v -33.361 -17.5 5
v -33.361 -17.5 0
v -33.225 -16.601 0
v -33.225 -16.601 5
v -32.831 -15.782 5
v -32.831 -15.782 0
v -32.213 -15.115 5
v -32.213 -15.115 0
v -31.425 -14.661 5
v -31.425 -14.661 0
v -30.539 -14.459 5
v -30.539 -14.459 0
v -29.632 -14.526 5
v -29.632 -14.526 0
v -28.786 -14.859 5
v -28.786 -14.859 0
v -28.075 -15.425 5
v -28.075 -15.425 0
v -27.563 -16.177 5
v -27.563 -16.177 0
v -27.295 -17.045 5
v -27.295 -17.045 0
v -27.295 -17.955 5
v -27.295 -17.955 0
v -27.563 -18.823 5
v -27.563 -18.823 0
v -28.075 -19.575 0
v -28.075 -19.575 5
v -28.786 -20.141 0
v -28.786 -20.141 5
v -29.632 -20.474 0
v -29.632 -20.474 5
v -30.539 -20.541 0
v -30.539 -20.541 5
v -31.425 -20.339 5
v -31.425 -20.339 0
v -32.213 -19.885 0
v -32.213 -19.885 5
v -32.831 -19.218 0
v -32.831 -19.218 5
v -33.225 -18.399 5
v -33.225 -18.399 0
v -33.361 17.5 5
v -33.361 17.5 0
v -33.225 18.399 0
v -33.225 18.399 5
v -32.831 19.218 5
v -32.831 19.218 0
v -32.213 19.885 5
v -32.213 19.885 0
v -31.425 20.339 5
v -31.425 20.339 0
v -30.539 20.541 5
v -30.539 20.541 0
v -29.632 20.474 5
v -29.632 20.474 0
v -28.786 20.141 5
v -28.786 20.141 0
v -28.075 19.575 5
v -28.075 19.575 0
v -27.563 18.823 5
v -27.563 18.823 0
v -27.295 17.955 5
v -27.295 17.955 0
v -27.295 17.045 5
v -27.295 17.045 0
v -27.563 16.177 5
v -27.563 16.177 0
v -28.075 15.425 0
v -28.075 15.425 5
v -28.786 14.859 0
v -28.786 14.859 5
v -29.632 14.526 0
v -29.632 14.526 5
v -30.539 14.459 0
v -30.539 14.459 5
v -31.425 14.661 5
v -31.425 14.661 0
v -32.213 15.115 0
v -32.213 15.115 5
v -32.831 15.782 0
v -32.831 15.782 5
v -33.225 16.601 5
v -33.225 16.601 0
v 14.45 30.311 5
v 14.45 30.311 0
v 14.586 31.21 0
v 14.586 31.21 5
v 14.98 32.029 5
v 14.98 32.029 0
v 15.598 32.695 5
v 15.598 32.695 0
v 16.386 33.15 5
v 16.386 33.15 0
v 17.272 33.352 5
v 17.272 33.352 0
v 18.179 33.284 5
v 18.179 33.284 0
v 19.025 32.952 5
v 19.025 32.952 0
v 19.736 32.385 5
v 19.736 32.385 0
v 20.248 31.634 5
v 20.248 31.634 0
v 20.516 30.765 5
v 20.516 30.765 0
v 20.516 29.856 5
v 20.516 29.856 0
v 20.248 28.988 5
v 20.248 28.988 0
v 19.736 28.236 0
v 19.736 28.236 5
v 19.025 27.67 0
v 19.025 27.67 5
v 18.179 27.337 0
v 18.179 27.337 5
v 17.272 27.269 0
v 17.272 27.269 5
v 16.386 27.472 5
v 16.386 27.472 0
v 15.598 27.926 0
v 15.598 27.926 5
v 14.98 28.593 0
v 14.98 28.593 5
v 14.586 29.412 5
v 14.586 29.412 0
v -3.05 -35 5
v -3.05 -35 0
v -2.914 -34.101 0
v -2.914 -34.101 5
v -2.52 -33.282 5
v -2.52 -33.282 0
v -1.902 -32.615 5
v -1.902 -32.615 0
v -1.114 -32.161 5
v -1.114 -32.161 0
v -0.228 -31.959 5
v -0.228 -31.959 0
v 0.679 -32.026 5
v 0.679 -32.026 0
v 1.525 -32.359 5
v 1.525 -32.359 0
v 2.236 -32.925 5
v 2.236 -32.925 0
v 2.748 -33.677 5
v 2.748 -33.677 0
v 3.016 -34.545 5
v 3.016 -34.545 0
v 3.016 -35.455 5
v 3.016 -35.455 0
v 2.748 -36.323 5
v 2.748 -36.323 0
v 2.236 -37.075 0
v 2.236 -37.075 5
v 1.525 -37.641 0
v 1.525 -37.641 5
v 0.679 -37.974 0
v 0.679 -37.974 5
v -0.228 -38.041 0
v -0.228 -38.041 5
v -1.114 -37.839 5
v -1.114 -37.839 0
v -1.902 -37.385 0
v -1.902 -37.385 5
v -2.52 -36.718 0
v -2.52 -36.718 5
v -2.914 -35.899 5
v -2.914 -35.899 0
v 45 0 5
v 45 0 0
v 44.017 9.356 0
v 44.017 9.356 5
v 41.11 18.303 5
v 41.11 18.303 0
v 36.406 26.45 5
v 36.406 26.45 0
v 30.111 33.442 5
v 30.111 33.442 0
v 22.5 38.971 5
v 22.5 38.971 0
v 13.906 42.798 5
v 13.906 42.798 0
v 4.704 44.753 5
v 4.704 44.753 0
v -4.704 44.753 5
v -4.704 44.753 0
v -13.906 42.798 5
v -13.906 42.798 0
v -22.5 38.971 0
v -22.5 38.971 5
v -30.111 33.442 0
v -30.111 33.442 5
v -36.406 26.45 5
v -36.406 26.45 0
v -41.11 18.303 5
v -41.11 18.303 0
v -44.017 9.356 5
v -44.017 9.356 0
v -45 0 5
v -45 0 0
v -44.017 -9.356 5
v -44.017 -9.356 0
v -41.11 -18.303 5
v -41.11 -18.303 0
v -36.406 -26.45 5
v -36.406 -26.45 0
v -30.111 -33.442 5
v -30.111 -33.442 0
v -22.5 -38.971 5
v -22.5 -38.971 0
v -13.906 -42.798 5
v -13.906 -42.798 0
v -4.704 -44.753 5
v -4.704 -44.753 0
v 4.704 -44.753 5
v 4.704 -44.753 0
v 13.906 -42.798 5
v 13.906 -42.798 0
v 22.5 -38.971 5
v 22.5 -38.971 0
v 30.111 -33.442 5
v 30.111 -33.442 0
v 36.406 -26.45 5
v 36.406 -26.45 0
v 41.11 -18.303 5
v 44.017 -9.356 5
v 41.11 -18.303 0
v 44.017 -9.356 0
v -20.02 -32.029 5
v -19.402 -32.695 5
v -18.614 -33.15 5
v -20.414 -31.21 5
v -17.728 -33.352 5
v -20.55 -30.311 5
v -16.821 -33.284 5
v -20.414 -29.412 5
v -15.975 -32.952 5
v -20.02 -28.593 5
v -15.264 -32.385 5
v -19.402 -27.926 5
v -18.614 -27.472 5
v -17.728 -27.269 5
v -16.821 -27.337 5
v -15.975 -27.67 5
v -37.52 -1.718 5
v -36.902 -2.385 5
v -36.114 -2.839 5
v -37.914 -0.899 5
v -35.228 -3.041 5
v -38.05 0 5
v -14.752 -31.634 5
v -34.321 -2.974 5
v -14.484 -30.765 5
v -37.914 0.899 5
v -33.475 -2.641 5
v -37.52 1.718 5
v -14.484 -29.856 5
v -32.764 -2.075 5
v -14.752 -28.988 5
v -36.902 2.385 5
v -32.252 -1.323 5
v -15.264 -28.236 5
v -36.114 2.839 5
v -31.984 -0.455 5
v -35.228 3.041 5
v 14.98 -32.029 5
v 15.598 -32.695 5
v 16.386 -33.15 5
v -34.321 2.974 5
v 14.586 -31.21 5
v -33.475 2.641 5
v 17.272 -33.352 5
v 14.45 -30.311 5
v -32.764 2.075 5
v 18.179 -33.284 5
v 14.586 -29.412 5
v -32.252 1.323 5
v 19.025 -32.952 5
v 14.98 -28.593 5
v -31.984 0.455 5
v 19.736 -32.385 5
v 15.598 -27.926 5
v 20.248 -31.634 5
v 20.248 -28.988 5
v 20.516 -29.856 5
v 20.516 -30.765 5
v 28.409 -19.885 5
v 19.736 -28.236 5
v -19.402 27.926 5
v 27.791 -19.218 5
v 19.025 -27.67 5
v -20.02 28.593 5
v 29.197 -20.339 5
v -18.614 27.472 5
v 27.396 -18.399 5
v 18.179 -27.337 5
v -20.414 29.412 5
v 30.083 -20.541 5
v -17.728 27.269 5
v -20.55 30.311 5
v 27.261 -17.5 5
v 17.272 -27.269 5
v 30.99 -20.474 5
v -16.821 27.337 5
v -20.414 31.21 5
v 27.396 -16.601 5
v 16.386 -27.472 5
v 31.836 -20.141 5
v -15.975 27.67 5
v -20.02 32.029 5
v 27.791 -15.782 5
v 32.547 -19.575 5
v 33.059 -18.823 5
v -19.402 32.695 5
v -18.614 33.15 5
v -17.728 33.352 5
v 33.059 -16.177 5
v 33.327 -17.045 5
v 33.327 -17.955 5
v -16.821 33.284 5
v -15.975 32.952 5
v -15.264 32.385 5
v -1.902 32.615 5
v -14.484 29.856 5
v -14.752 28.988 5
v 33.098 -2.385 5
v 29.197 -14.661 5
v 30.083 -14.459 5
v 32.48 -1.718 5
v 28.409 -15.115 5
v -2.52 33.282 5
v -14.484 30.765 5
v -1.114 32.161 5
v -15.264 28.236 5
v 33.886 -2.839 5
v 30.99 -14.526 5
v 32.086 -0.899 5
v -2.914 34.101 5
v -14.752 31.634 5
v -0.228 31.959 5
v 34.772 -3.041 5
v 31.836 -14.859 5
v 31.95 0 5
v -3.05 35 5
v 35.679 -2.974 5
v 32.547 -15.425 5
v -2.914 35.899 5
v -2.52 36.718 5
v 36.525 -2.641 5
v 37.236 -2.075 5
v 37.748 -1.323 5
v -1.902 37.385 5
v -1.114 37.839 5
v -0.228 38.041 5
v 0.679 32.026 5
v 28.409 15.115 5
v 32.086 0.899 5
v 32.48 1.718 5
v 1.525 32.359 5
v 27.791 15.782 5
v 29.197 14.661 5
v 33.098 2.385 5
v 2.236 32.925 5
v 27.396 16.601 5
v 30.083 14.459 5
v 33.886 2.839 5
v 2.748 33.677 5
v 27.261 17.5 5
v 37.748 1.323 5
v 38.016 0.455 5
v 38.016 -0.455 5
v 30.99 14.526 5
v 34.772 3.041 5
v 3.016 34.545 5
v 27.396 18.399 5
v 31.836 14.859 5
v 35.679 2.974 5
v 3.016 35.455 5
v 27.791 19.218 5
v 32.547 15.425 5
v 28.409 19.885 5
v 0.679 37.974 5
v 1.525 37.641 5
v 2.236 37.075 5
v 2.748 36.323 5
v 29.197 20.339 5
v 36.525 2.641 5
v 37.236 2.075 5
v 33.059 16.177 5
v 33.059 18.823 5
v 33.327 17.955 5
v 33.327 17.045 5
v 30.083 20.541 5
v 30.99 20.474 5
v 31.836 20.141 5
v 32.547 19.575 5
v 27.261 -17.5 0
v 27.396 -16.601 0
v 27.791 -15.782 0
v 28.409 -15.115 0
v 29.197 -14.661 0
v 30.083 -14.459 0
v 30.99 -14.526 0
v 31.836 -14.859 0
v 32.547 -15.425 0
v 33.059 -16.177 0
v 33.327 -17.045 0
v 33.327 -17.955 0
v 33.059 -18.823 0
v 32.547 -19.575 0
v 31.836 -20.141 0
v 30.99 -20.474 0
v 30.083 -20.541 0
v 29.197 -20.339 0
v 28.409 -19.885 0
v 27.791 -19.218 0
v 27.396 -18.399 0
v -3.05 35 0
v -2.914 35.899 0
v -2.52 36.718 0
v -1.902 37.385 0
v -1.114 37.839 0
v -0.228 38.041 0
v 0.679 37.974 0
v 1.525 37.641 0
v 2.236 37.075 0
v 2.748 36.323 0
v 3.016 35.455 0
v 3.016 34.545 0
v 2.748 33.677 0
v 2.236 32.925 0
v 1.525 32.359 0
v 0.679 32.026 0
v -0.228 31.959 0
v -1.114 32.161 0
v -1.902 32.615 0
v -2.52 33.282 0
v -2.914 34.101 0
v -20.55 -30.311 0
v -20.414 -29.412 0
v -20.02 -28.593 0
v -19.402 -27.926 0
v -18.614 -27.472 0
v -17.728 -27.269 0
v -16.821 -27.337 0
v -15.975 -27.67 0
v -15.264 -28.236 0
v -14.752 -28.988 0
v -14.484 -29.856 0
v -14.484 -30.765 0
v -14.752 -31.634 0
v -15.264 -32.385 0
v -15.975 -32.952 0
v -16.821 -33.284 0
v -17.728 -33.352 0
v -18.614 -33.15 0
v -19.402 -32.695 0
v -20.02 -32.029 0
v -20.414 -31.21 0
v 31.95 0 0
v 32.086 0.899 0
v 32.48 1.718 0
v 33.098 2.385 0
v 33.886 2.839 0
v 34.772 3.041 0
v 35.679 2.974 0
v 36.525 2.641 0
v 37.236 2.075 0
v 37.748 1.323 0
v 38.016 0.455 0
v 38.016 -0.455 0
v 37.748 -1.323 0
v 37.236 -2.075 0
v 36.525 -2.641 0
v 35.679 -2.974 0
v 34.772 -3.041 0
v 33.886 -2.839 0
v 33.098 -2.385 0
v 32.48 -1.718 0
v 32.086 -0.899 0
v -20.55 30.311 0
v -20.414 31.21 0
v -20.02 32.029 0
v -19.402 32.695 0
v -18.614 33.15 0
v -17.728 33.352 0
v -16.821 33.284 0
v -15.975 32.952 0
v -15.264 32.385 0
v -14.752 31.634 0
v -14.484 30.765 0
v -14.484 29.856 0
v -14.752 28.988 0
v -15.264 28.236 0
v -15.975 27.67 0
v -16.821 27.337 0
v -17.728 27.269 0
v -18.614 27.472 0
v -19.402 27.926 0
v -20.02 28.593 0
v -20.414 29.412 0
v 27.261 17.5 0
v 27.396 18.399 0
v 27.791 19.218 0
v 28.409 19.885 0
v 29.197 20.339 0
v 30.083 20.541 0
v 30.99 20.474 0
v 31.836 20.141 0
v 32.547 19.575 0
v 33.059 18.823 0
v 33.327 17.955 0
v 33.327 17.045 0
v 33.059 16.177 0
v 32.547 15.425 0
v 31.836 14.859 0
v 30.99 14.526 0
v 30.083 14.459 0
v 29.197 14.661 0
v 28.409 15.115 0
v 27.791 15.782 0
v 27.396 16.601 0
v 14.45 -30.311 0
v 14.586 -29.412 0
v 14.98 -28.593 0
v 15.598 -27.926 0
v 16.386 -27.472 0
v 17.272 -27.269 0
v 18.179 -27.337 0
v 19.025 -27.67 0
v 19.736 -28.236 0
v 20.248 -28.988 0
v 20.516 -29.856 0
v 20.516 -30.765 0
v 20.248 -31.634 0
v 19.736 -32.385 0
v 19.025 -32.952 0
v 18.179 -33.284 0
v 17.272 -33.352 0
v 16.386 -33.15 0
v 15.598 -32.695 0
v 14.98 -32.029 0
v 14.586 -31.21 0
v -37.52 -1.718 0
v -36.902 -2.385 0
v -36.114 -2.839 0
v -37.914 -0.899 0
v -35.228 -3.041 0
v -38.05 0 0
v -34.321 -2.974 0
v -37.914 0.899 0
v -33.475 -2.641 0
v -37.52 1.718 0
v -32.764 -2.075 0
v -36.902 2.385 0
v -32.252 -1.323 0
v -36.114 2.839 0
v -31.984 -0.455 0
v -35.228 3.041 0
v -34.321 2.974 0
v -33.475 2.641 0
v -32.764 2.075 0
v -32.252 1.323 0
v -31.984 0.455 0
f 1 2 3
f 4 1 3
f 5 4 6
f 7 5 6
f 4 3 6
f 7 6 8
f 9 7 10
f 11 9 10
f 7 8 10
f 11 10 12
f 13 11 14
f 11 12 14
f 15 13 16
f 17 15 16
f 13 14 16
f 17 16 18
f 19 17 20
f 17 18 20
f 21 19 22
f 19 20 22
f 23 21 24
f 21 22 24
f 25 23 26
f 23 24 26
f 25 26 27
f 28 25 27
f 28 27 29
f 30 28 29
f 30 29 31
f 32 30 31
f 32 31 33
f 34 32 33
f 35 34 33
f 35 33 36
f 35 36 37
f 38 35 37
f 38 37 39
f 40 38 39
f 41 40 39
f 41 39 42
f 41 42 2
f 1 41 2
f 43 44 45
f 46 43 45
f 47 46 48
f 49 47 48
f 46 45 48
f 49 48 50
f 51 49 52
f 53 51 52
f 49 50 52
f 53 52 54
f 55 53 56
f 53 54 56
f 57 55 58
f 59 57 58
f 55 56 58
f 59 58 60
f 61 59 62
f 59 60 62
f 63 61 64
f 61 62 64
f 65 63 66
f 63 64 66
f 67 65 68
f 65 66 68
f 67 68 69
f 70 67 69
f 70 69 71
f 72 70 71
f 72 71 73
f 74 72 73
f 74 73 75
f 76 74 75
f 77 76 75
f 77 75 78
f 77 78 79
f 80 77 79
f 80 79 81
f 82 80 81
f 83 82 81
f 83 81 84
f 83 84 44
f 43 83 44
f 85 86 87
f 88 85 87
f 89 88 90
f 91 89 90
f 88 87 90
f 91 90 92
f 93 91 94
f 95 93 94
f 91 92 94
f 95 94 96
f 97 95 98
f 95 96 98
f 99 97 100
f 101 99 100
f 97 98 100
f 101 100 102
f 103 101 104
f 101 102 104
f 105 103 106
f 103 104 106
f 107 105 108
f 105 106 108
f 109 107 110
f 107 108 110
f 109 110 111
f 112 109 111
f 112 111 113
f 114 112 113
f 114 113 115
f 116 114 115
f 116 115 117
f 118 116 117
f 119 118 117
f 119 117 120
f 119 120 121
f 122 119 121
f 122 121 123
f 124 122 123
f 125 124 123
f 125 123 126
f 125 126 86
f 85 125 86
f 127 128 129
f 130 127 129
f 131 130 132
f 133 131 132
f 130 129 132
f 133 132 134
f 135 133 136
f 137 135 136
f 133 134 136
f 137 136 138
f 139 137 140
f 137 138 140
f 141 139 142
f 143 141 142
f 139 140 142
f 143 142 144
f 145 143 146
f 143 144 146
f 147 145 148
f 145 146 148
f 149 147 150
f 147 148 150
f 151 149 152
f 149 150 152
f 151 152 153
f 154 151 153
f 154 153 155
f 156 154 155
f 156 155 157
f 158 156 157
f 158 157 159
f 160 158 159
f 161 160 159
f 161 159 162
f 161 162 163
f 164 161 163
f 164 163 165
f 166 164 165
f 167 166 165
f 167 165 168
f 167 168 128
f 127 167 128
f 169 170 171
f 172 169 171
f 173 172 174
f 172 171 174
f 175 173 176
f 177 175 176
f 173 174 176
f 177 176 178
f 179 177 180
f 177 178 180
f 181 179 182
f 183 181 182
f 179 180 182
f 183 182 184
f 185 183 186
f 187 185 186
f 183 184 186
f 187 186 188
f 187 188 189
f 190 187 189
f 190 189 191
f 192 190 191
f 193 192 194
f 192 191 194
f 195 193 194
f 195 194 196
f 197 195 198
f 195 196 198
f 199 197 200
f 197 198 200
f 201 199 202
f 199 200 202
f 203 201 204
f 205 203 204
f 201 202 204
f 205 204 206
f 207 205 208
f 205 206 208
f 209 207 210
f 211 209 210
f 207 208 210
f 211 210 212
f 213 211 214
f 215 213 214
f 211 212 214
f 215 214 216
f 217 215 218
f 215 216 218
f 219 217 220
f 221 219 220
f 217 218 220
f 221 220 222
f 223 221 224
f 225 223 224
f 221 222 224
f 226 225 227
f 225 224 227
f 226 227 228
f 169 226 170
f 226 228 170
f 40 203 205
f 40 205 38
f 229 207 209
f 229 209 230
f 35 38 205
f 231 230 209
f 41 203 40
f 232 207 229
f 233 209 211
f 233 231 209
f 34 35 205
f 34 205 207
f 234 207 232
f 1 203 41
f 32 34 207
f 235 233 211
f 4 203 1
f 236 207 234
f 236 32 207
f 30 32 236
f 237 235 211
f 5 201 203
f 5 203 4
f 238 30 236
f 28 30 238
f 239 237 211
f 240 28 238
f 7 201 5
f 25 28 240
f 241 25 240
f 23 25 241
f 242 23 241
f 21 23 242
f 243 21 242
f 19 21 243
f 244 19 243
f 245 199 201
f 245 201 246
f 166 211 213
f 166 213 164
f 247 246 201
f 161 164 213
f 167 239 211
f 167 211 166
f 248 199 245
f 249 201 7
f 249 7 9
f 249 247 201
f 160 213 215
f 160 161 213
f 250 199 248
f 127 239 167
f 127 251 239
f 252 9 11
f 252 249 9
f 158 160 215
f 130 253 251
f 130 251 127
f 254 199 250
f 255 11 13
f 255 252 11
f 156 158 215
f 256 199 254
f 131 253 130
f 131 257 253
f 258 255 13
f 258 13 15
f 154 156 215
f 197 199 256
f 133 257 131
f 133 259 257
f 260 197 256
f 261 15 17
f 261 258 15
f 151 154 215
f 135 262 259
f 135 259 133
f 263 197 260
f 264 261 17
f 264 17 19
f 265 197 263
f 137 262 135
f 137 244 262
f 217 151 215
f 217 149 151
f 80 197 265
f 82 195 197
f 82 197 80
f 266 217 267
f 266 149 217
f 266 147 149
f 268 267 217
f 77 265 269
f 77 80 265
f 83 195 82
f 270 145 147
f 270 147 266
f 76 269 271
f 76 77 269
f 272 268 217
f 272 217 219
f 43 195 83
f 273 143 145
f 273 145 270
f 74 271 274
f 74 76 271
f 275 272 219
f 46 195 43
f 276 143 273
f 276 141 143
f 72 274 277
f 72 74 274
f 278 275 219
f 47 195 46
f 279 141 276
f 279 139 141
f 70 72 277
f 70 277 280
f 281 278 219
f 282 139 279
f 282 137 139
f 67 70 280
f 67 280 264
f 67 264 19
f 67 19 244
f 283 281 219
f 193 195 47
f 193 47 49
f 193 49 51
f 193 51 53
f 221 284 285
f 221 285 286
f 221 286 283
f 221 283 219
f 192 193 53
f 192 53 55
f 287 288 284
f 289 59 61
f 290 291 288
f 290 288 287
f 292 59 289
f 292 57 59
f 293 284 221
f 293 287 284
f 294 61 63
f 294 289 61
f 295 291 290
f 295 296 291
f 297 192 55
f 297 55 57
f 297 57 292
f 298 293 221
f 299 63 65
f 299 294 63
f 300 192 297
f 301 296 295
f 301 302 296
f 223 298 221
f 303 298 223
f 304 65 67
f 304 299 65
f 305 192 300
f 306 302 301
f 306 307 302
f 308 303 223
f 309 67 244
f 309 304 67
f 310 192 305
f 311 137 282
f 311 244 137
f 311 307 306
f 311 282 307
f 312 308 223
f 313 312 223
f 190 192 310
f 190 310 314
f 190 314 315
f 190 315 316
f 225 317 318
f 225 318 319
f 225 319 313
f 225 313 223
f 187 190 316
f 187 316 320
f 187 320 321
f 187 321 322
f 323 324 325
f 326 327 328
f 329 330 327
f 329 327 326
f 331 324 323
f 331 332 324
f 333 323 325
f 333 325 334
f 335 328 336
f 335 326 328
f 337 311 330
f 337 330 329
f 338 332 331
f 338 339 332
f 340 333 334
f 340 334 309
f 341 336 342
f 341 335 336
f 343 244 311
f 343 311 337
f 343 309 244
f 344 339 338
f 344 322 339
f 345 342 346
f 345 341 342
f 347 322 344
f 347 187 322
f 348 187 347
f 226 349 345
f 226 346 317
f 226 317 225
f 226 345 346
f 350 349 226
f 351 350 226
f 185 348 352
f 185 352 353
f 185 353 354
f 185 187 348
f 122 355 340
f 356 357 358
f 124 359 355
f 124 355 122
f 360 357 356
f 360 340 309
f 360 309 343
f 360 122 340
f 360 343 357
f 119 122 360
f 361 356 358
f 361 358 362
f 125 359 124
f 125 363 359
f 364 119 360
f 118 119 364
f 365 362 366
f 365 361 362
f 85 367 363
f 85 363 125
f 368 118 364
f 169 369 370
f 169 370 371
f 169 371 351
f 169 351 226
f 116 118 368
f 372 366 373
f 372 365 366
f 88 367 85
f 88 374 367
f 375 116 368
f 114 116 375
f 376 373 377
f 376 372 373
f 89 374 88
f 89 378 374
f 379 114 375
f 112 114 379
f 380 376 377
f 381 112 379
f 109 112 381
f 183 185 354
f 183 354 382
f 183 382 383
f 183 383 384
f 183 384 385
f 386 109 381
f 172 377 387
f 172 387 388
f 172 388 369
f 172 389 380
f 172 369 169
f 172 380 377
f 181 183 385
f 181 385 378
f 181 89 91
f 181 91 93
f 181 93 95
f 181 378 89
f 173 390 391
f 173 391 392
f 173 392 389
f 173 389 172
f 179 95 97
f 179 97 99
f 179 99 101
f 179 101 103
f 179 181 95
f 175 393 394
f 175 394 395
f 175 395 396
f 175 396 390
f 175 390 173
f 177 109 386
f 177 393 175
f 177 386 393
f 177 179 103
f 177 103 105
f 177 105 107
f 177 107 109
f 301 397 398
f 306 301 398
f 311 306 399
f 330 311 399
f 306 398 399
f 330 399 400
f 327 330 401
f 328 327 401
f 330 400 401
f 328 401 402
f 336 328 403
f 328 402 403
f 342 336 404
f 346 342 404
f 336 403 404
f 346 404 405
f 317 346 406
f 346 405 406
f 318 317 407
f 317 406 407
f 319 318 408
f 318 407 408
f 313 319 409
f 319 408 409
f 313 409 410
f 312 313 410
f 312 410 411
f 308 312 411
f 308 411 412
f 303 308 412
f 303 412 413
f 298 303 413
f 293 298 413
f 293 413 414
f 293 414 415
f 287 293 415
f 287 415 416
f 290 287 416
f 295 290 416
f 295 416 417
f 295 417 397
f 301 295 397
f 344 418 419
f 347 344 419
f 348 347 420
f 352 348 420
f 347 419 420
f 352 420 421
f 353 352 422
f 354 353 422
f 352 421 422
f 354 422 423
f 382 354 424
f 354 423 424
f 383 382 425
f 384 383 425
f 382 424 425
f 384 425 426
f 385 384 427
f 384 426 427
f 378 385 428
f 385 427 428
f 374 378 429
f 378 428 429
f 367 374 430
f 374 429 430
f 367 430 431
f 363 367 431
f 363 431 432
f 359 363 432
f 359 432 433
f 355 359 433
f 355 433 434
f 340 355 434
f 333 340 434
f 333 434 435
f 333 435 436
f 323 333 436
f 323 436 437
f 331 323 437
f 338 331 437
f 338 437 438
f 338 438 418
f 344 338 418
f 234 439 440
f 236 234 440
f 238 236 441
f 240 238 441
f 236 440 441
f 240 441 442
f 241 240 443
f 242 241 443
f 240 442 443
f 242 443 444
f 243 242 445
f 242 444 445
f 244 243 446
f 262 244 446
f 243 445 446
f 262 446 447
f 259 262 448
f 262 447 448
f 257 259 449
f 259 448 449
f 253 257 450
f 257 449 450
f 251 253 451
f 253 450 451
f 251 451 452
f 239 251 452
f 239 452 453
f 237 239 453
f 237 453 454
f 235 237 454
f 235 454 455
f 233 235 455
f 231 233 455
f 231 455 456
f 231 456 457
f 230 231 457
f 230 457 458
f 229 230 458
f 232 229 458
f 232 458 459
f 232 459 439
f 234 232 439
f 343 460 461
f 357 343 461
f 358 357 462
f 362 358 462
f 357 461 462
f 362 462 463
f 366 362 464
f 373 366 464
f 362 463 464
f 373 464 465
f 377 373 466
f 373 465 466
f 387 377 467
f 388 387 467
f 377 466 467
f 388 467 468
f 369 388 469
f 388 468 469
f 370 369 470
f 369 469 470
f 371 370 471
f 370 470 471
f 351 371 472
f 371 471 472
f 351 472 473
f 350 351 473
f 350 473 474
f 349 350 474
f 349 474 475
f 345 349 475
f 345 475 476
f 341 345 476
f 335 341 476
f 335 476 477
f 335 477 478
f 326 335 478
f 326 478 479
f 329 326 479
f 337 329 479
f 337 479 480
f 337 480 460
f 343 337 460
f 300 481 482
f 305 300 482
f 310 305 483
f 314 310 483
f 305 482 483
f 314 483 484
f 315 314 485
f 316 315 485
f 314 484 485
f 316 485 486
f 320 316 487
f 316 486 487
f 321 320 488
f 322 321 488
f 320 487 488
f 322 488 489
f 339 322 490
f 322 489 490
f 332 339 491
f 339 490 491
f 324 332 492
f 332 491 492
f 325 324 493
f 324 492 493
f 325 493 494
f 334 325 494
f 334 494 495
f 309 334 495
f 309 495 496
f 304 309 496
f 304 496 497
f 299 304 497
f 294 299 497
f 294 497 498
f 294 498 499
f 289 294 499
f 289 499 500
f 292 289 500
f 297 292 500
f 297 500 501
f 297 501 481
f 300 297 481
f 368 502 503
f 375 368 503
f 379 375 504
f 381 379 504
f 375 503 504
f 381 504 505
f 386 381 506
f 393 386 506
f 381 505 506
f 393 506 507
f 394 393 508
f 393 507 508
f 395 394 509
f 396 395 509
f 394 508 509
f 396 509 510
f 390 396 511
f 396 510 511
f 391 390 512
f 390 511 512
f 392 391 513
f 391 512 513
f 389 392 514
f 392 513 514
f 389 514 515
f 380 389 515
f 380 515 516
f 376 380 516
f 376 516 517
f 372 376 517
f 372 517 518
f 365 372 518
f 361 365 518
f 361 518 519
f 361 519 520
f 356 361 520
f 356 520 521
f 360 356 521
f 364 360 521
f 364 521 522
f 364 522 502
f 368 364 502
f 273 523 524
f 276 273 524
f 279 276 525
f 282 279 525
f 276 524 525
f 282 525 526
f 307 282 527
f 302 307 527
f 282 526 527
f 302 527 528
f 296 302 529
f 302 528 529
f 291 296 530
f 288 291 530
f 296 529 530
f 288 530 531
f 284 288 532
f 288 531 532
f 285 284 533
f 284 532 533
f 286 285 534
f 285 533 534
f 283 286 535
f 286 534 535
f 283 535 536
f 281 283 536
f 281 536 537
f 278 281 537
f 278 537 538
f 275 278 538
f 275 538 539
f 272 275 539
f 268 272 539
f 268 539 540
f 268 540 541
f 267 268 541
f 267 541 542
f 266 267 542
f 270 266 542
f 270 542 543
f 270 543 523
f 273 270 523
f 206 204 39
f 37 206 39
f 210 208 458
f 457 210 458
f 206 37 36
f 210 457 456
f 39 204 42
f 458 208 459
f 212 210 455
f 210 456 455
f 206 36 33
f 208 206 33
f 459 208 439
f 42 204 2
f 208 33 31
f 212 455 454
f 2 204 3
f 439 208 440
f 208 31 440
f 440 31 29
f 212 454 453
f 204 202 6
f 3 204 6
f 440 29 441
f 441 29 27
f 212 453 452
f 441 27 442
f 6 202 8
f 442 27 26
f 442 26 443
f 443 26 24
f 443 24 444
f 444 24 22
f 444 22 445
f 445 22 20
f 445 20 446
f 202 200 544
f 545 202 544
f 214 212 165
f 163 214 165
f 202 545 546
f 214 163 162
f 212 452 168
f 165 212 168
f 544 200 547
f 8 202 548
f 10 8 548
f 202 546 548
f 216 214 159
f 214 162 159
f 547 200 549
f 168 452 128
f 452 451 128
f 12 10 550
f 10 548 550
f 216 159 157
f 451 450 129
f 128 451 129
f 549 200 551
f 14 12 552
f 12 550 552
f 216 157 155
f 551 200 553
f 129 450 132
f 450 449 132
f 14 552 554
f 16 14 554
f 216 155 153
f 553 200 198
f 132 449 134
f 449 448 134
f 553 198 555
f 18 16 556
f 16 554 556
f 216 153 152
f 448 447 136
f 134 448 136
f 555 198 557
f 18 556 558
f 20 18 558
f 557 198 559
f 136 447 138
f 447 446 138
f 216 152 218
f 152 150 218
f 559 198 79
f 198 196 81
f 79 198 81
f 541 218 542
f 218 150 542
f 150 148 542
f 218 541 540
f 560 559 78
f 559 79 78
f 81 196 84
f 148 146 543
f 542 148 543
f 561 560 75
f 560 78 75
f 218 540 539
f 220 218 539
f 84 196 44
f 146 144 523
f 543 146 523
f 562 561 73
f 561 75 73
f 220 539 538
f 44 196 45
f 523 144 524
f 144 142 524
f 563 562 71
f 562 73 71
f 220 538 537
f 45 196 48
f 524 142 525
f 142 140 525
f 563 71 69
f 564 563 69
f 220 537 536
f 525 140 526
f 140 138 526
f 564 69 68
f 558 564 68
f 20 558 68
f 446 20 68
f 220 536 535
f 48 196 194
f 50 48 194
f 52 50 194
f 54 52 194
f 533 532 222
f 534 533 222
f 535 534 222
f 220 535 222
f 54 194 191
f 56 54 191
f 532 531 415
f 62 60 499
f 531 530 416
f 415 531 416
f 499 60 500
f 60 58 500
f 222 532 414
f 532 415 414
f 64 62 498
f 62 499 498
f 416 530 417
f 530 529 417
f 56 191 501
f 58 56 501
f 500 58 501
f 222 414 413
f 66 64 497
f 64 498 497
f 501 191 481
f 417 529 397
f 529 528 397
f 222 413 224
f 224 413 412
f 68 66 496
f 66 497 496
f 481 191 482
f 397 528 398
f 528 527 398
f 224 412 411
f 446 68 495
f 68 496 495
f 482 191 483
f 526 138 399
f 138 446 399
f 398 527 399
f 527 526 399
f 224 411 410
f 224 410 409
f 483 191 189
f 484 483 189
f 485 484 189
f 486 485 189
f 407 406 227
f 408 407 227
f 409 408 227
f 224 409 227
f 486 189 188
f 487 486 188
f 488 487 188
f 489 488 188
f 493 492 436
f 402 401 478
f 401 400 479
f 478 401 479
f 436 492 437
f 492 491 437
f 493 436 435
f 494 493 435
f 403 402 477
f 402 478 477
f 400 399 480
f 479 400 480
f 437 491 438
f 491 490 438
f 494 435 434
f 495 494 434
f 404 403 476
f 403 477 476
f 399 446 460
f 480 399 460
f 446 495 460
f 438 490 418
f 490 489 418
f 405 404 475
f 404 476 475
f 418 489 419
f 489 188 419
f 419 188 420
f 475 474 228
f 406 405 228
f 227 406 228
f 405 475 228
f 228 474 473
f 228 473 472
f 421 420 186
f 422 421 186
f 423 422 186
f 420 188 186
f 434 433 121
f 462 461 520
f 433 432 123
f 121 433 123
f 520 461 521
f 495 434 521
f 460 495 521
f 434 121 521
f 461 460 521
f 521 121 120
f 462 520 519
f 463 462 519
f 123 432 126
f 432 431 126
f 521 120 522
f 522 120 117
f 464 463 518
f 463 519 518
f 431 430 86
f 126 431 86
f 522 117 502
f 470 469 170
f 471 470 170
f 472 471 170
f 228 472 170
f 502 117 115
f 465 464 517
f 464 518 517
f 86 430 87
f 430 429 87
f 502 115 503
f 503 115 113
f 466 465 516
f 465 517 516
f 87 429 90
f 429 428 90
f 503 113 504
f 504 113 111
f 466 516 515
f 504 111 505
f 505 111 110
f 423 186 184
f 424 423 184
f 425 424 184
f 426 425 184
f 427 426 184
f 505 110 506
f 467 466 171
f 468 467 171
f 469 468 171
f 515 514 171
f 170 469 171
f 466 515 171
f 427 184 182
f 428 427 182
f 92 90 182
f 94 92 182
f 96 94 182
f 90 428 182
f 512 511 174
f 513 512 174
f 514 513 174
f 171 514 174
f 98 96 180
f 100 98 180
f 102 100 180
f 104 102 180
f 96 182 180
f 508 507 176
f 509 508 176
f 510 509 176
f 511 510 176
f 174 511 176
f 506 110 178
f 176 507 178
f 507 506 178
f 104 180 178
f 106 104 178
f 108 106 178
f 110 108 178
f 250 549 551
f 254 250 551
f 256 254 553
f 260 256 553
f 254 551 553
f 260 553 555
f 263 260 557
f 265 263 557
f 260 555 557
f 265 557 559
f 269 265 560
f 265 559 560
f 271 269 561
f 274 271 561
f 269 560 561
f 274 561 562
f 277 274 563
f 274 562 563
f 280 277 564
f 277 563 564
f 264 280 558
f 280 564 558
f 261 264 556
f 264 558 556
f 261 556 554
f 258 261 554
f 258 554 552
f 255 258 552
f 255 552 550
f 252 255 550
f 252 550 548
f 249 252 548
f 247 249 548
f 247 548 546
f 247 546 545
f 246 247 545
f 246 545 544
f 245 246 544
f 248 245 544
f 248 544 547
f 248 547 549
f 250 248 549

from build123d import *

# Parameters (mm, degrees)
SKETCH1_R                      = 45
BOSS_EXTRUDE1_DEPTH            = 5
F_6_1_6_1_DIAMETER_HOLE1_D     = 6.1
F_6_1_6_1_DIAMETER_HOLE1_DEPTH = 10
F_6_1_6_1_DIAMETER_HOLE1_TIP   = 1.832624888


with BuildPart() as part:
    # Sketch1 → Boss-Extrude1 (new body)
    with BuildSketch(Plane.XY):
        Circle(SKETCH1_R)
    extrude(amount=BOSS_EXTRUDE1_DEPTH)

    # Ø6.1 (6.1) Diameter Hole1
    with Locations(Plane.XY.offset(5)):
        with Locations((-35, 0), (-30.310889132, 17.5), (-17.5, 30.310889132), (0, 35), (17.5, 30.310889132), (30.310889132, 17.5), (35, 0), (30.310889132, -17.5), (17.5, -30.310889132), (0, -35), (-17.5, -30.310889132), (-30.310889132, -17.5)):
            Hole(F_6_1_6_1_DIAMETER_HOLE1_D / 2, depth=F_6_1_6_1_DIAMETER_HOLE1_DEPTH)
            with Locations((0, 0, -(F_6_1_6_1_DIAMETER_HOLE1_DEPTH + F_6_1_6_1_DIAMETER_HOLE1_TIP / 2))):  # 118° drill point
                Cone(0, F_6_1_6_1_DIAMETER_HOLE1_D / 2, F_6_1_6_1_DIAMETER_HOLE1_TIP, mode=Mode.SUBTRACT)


solid = part.part
